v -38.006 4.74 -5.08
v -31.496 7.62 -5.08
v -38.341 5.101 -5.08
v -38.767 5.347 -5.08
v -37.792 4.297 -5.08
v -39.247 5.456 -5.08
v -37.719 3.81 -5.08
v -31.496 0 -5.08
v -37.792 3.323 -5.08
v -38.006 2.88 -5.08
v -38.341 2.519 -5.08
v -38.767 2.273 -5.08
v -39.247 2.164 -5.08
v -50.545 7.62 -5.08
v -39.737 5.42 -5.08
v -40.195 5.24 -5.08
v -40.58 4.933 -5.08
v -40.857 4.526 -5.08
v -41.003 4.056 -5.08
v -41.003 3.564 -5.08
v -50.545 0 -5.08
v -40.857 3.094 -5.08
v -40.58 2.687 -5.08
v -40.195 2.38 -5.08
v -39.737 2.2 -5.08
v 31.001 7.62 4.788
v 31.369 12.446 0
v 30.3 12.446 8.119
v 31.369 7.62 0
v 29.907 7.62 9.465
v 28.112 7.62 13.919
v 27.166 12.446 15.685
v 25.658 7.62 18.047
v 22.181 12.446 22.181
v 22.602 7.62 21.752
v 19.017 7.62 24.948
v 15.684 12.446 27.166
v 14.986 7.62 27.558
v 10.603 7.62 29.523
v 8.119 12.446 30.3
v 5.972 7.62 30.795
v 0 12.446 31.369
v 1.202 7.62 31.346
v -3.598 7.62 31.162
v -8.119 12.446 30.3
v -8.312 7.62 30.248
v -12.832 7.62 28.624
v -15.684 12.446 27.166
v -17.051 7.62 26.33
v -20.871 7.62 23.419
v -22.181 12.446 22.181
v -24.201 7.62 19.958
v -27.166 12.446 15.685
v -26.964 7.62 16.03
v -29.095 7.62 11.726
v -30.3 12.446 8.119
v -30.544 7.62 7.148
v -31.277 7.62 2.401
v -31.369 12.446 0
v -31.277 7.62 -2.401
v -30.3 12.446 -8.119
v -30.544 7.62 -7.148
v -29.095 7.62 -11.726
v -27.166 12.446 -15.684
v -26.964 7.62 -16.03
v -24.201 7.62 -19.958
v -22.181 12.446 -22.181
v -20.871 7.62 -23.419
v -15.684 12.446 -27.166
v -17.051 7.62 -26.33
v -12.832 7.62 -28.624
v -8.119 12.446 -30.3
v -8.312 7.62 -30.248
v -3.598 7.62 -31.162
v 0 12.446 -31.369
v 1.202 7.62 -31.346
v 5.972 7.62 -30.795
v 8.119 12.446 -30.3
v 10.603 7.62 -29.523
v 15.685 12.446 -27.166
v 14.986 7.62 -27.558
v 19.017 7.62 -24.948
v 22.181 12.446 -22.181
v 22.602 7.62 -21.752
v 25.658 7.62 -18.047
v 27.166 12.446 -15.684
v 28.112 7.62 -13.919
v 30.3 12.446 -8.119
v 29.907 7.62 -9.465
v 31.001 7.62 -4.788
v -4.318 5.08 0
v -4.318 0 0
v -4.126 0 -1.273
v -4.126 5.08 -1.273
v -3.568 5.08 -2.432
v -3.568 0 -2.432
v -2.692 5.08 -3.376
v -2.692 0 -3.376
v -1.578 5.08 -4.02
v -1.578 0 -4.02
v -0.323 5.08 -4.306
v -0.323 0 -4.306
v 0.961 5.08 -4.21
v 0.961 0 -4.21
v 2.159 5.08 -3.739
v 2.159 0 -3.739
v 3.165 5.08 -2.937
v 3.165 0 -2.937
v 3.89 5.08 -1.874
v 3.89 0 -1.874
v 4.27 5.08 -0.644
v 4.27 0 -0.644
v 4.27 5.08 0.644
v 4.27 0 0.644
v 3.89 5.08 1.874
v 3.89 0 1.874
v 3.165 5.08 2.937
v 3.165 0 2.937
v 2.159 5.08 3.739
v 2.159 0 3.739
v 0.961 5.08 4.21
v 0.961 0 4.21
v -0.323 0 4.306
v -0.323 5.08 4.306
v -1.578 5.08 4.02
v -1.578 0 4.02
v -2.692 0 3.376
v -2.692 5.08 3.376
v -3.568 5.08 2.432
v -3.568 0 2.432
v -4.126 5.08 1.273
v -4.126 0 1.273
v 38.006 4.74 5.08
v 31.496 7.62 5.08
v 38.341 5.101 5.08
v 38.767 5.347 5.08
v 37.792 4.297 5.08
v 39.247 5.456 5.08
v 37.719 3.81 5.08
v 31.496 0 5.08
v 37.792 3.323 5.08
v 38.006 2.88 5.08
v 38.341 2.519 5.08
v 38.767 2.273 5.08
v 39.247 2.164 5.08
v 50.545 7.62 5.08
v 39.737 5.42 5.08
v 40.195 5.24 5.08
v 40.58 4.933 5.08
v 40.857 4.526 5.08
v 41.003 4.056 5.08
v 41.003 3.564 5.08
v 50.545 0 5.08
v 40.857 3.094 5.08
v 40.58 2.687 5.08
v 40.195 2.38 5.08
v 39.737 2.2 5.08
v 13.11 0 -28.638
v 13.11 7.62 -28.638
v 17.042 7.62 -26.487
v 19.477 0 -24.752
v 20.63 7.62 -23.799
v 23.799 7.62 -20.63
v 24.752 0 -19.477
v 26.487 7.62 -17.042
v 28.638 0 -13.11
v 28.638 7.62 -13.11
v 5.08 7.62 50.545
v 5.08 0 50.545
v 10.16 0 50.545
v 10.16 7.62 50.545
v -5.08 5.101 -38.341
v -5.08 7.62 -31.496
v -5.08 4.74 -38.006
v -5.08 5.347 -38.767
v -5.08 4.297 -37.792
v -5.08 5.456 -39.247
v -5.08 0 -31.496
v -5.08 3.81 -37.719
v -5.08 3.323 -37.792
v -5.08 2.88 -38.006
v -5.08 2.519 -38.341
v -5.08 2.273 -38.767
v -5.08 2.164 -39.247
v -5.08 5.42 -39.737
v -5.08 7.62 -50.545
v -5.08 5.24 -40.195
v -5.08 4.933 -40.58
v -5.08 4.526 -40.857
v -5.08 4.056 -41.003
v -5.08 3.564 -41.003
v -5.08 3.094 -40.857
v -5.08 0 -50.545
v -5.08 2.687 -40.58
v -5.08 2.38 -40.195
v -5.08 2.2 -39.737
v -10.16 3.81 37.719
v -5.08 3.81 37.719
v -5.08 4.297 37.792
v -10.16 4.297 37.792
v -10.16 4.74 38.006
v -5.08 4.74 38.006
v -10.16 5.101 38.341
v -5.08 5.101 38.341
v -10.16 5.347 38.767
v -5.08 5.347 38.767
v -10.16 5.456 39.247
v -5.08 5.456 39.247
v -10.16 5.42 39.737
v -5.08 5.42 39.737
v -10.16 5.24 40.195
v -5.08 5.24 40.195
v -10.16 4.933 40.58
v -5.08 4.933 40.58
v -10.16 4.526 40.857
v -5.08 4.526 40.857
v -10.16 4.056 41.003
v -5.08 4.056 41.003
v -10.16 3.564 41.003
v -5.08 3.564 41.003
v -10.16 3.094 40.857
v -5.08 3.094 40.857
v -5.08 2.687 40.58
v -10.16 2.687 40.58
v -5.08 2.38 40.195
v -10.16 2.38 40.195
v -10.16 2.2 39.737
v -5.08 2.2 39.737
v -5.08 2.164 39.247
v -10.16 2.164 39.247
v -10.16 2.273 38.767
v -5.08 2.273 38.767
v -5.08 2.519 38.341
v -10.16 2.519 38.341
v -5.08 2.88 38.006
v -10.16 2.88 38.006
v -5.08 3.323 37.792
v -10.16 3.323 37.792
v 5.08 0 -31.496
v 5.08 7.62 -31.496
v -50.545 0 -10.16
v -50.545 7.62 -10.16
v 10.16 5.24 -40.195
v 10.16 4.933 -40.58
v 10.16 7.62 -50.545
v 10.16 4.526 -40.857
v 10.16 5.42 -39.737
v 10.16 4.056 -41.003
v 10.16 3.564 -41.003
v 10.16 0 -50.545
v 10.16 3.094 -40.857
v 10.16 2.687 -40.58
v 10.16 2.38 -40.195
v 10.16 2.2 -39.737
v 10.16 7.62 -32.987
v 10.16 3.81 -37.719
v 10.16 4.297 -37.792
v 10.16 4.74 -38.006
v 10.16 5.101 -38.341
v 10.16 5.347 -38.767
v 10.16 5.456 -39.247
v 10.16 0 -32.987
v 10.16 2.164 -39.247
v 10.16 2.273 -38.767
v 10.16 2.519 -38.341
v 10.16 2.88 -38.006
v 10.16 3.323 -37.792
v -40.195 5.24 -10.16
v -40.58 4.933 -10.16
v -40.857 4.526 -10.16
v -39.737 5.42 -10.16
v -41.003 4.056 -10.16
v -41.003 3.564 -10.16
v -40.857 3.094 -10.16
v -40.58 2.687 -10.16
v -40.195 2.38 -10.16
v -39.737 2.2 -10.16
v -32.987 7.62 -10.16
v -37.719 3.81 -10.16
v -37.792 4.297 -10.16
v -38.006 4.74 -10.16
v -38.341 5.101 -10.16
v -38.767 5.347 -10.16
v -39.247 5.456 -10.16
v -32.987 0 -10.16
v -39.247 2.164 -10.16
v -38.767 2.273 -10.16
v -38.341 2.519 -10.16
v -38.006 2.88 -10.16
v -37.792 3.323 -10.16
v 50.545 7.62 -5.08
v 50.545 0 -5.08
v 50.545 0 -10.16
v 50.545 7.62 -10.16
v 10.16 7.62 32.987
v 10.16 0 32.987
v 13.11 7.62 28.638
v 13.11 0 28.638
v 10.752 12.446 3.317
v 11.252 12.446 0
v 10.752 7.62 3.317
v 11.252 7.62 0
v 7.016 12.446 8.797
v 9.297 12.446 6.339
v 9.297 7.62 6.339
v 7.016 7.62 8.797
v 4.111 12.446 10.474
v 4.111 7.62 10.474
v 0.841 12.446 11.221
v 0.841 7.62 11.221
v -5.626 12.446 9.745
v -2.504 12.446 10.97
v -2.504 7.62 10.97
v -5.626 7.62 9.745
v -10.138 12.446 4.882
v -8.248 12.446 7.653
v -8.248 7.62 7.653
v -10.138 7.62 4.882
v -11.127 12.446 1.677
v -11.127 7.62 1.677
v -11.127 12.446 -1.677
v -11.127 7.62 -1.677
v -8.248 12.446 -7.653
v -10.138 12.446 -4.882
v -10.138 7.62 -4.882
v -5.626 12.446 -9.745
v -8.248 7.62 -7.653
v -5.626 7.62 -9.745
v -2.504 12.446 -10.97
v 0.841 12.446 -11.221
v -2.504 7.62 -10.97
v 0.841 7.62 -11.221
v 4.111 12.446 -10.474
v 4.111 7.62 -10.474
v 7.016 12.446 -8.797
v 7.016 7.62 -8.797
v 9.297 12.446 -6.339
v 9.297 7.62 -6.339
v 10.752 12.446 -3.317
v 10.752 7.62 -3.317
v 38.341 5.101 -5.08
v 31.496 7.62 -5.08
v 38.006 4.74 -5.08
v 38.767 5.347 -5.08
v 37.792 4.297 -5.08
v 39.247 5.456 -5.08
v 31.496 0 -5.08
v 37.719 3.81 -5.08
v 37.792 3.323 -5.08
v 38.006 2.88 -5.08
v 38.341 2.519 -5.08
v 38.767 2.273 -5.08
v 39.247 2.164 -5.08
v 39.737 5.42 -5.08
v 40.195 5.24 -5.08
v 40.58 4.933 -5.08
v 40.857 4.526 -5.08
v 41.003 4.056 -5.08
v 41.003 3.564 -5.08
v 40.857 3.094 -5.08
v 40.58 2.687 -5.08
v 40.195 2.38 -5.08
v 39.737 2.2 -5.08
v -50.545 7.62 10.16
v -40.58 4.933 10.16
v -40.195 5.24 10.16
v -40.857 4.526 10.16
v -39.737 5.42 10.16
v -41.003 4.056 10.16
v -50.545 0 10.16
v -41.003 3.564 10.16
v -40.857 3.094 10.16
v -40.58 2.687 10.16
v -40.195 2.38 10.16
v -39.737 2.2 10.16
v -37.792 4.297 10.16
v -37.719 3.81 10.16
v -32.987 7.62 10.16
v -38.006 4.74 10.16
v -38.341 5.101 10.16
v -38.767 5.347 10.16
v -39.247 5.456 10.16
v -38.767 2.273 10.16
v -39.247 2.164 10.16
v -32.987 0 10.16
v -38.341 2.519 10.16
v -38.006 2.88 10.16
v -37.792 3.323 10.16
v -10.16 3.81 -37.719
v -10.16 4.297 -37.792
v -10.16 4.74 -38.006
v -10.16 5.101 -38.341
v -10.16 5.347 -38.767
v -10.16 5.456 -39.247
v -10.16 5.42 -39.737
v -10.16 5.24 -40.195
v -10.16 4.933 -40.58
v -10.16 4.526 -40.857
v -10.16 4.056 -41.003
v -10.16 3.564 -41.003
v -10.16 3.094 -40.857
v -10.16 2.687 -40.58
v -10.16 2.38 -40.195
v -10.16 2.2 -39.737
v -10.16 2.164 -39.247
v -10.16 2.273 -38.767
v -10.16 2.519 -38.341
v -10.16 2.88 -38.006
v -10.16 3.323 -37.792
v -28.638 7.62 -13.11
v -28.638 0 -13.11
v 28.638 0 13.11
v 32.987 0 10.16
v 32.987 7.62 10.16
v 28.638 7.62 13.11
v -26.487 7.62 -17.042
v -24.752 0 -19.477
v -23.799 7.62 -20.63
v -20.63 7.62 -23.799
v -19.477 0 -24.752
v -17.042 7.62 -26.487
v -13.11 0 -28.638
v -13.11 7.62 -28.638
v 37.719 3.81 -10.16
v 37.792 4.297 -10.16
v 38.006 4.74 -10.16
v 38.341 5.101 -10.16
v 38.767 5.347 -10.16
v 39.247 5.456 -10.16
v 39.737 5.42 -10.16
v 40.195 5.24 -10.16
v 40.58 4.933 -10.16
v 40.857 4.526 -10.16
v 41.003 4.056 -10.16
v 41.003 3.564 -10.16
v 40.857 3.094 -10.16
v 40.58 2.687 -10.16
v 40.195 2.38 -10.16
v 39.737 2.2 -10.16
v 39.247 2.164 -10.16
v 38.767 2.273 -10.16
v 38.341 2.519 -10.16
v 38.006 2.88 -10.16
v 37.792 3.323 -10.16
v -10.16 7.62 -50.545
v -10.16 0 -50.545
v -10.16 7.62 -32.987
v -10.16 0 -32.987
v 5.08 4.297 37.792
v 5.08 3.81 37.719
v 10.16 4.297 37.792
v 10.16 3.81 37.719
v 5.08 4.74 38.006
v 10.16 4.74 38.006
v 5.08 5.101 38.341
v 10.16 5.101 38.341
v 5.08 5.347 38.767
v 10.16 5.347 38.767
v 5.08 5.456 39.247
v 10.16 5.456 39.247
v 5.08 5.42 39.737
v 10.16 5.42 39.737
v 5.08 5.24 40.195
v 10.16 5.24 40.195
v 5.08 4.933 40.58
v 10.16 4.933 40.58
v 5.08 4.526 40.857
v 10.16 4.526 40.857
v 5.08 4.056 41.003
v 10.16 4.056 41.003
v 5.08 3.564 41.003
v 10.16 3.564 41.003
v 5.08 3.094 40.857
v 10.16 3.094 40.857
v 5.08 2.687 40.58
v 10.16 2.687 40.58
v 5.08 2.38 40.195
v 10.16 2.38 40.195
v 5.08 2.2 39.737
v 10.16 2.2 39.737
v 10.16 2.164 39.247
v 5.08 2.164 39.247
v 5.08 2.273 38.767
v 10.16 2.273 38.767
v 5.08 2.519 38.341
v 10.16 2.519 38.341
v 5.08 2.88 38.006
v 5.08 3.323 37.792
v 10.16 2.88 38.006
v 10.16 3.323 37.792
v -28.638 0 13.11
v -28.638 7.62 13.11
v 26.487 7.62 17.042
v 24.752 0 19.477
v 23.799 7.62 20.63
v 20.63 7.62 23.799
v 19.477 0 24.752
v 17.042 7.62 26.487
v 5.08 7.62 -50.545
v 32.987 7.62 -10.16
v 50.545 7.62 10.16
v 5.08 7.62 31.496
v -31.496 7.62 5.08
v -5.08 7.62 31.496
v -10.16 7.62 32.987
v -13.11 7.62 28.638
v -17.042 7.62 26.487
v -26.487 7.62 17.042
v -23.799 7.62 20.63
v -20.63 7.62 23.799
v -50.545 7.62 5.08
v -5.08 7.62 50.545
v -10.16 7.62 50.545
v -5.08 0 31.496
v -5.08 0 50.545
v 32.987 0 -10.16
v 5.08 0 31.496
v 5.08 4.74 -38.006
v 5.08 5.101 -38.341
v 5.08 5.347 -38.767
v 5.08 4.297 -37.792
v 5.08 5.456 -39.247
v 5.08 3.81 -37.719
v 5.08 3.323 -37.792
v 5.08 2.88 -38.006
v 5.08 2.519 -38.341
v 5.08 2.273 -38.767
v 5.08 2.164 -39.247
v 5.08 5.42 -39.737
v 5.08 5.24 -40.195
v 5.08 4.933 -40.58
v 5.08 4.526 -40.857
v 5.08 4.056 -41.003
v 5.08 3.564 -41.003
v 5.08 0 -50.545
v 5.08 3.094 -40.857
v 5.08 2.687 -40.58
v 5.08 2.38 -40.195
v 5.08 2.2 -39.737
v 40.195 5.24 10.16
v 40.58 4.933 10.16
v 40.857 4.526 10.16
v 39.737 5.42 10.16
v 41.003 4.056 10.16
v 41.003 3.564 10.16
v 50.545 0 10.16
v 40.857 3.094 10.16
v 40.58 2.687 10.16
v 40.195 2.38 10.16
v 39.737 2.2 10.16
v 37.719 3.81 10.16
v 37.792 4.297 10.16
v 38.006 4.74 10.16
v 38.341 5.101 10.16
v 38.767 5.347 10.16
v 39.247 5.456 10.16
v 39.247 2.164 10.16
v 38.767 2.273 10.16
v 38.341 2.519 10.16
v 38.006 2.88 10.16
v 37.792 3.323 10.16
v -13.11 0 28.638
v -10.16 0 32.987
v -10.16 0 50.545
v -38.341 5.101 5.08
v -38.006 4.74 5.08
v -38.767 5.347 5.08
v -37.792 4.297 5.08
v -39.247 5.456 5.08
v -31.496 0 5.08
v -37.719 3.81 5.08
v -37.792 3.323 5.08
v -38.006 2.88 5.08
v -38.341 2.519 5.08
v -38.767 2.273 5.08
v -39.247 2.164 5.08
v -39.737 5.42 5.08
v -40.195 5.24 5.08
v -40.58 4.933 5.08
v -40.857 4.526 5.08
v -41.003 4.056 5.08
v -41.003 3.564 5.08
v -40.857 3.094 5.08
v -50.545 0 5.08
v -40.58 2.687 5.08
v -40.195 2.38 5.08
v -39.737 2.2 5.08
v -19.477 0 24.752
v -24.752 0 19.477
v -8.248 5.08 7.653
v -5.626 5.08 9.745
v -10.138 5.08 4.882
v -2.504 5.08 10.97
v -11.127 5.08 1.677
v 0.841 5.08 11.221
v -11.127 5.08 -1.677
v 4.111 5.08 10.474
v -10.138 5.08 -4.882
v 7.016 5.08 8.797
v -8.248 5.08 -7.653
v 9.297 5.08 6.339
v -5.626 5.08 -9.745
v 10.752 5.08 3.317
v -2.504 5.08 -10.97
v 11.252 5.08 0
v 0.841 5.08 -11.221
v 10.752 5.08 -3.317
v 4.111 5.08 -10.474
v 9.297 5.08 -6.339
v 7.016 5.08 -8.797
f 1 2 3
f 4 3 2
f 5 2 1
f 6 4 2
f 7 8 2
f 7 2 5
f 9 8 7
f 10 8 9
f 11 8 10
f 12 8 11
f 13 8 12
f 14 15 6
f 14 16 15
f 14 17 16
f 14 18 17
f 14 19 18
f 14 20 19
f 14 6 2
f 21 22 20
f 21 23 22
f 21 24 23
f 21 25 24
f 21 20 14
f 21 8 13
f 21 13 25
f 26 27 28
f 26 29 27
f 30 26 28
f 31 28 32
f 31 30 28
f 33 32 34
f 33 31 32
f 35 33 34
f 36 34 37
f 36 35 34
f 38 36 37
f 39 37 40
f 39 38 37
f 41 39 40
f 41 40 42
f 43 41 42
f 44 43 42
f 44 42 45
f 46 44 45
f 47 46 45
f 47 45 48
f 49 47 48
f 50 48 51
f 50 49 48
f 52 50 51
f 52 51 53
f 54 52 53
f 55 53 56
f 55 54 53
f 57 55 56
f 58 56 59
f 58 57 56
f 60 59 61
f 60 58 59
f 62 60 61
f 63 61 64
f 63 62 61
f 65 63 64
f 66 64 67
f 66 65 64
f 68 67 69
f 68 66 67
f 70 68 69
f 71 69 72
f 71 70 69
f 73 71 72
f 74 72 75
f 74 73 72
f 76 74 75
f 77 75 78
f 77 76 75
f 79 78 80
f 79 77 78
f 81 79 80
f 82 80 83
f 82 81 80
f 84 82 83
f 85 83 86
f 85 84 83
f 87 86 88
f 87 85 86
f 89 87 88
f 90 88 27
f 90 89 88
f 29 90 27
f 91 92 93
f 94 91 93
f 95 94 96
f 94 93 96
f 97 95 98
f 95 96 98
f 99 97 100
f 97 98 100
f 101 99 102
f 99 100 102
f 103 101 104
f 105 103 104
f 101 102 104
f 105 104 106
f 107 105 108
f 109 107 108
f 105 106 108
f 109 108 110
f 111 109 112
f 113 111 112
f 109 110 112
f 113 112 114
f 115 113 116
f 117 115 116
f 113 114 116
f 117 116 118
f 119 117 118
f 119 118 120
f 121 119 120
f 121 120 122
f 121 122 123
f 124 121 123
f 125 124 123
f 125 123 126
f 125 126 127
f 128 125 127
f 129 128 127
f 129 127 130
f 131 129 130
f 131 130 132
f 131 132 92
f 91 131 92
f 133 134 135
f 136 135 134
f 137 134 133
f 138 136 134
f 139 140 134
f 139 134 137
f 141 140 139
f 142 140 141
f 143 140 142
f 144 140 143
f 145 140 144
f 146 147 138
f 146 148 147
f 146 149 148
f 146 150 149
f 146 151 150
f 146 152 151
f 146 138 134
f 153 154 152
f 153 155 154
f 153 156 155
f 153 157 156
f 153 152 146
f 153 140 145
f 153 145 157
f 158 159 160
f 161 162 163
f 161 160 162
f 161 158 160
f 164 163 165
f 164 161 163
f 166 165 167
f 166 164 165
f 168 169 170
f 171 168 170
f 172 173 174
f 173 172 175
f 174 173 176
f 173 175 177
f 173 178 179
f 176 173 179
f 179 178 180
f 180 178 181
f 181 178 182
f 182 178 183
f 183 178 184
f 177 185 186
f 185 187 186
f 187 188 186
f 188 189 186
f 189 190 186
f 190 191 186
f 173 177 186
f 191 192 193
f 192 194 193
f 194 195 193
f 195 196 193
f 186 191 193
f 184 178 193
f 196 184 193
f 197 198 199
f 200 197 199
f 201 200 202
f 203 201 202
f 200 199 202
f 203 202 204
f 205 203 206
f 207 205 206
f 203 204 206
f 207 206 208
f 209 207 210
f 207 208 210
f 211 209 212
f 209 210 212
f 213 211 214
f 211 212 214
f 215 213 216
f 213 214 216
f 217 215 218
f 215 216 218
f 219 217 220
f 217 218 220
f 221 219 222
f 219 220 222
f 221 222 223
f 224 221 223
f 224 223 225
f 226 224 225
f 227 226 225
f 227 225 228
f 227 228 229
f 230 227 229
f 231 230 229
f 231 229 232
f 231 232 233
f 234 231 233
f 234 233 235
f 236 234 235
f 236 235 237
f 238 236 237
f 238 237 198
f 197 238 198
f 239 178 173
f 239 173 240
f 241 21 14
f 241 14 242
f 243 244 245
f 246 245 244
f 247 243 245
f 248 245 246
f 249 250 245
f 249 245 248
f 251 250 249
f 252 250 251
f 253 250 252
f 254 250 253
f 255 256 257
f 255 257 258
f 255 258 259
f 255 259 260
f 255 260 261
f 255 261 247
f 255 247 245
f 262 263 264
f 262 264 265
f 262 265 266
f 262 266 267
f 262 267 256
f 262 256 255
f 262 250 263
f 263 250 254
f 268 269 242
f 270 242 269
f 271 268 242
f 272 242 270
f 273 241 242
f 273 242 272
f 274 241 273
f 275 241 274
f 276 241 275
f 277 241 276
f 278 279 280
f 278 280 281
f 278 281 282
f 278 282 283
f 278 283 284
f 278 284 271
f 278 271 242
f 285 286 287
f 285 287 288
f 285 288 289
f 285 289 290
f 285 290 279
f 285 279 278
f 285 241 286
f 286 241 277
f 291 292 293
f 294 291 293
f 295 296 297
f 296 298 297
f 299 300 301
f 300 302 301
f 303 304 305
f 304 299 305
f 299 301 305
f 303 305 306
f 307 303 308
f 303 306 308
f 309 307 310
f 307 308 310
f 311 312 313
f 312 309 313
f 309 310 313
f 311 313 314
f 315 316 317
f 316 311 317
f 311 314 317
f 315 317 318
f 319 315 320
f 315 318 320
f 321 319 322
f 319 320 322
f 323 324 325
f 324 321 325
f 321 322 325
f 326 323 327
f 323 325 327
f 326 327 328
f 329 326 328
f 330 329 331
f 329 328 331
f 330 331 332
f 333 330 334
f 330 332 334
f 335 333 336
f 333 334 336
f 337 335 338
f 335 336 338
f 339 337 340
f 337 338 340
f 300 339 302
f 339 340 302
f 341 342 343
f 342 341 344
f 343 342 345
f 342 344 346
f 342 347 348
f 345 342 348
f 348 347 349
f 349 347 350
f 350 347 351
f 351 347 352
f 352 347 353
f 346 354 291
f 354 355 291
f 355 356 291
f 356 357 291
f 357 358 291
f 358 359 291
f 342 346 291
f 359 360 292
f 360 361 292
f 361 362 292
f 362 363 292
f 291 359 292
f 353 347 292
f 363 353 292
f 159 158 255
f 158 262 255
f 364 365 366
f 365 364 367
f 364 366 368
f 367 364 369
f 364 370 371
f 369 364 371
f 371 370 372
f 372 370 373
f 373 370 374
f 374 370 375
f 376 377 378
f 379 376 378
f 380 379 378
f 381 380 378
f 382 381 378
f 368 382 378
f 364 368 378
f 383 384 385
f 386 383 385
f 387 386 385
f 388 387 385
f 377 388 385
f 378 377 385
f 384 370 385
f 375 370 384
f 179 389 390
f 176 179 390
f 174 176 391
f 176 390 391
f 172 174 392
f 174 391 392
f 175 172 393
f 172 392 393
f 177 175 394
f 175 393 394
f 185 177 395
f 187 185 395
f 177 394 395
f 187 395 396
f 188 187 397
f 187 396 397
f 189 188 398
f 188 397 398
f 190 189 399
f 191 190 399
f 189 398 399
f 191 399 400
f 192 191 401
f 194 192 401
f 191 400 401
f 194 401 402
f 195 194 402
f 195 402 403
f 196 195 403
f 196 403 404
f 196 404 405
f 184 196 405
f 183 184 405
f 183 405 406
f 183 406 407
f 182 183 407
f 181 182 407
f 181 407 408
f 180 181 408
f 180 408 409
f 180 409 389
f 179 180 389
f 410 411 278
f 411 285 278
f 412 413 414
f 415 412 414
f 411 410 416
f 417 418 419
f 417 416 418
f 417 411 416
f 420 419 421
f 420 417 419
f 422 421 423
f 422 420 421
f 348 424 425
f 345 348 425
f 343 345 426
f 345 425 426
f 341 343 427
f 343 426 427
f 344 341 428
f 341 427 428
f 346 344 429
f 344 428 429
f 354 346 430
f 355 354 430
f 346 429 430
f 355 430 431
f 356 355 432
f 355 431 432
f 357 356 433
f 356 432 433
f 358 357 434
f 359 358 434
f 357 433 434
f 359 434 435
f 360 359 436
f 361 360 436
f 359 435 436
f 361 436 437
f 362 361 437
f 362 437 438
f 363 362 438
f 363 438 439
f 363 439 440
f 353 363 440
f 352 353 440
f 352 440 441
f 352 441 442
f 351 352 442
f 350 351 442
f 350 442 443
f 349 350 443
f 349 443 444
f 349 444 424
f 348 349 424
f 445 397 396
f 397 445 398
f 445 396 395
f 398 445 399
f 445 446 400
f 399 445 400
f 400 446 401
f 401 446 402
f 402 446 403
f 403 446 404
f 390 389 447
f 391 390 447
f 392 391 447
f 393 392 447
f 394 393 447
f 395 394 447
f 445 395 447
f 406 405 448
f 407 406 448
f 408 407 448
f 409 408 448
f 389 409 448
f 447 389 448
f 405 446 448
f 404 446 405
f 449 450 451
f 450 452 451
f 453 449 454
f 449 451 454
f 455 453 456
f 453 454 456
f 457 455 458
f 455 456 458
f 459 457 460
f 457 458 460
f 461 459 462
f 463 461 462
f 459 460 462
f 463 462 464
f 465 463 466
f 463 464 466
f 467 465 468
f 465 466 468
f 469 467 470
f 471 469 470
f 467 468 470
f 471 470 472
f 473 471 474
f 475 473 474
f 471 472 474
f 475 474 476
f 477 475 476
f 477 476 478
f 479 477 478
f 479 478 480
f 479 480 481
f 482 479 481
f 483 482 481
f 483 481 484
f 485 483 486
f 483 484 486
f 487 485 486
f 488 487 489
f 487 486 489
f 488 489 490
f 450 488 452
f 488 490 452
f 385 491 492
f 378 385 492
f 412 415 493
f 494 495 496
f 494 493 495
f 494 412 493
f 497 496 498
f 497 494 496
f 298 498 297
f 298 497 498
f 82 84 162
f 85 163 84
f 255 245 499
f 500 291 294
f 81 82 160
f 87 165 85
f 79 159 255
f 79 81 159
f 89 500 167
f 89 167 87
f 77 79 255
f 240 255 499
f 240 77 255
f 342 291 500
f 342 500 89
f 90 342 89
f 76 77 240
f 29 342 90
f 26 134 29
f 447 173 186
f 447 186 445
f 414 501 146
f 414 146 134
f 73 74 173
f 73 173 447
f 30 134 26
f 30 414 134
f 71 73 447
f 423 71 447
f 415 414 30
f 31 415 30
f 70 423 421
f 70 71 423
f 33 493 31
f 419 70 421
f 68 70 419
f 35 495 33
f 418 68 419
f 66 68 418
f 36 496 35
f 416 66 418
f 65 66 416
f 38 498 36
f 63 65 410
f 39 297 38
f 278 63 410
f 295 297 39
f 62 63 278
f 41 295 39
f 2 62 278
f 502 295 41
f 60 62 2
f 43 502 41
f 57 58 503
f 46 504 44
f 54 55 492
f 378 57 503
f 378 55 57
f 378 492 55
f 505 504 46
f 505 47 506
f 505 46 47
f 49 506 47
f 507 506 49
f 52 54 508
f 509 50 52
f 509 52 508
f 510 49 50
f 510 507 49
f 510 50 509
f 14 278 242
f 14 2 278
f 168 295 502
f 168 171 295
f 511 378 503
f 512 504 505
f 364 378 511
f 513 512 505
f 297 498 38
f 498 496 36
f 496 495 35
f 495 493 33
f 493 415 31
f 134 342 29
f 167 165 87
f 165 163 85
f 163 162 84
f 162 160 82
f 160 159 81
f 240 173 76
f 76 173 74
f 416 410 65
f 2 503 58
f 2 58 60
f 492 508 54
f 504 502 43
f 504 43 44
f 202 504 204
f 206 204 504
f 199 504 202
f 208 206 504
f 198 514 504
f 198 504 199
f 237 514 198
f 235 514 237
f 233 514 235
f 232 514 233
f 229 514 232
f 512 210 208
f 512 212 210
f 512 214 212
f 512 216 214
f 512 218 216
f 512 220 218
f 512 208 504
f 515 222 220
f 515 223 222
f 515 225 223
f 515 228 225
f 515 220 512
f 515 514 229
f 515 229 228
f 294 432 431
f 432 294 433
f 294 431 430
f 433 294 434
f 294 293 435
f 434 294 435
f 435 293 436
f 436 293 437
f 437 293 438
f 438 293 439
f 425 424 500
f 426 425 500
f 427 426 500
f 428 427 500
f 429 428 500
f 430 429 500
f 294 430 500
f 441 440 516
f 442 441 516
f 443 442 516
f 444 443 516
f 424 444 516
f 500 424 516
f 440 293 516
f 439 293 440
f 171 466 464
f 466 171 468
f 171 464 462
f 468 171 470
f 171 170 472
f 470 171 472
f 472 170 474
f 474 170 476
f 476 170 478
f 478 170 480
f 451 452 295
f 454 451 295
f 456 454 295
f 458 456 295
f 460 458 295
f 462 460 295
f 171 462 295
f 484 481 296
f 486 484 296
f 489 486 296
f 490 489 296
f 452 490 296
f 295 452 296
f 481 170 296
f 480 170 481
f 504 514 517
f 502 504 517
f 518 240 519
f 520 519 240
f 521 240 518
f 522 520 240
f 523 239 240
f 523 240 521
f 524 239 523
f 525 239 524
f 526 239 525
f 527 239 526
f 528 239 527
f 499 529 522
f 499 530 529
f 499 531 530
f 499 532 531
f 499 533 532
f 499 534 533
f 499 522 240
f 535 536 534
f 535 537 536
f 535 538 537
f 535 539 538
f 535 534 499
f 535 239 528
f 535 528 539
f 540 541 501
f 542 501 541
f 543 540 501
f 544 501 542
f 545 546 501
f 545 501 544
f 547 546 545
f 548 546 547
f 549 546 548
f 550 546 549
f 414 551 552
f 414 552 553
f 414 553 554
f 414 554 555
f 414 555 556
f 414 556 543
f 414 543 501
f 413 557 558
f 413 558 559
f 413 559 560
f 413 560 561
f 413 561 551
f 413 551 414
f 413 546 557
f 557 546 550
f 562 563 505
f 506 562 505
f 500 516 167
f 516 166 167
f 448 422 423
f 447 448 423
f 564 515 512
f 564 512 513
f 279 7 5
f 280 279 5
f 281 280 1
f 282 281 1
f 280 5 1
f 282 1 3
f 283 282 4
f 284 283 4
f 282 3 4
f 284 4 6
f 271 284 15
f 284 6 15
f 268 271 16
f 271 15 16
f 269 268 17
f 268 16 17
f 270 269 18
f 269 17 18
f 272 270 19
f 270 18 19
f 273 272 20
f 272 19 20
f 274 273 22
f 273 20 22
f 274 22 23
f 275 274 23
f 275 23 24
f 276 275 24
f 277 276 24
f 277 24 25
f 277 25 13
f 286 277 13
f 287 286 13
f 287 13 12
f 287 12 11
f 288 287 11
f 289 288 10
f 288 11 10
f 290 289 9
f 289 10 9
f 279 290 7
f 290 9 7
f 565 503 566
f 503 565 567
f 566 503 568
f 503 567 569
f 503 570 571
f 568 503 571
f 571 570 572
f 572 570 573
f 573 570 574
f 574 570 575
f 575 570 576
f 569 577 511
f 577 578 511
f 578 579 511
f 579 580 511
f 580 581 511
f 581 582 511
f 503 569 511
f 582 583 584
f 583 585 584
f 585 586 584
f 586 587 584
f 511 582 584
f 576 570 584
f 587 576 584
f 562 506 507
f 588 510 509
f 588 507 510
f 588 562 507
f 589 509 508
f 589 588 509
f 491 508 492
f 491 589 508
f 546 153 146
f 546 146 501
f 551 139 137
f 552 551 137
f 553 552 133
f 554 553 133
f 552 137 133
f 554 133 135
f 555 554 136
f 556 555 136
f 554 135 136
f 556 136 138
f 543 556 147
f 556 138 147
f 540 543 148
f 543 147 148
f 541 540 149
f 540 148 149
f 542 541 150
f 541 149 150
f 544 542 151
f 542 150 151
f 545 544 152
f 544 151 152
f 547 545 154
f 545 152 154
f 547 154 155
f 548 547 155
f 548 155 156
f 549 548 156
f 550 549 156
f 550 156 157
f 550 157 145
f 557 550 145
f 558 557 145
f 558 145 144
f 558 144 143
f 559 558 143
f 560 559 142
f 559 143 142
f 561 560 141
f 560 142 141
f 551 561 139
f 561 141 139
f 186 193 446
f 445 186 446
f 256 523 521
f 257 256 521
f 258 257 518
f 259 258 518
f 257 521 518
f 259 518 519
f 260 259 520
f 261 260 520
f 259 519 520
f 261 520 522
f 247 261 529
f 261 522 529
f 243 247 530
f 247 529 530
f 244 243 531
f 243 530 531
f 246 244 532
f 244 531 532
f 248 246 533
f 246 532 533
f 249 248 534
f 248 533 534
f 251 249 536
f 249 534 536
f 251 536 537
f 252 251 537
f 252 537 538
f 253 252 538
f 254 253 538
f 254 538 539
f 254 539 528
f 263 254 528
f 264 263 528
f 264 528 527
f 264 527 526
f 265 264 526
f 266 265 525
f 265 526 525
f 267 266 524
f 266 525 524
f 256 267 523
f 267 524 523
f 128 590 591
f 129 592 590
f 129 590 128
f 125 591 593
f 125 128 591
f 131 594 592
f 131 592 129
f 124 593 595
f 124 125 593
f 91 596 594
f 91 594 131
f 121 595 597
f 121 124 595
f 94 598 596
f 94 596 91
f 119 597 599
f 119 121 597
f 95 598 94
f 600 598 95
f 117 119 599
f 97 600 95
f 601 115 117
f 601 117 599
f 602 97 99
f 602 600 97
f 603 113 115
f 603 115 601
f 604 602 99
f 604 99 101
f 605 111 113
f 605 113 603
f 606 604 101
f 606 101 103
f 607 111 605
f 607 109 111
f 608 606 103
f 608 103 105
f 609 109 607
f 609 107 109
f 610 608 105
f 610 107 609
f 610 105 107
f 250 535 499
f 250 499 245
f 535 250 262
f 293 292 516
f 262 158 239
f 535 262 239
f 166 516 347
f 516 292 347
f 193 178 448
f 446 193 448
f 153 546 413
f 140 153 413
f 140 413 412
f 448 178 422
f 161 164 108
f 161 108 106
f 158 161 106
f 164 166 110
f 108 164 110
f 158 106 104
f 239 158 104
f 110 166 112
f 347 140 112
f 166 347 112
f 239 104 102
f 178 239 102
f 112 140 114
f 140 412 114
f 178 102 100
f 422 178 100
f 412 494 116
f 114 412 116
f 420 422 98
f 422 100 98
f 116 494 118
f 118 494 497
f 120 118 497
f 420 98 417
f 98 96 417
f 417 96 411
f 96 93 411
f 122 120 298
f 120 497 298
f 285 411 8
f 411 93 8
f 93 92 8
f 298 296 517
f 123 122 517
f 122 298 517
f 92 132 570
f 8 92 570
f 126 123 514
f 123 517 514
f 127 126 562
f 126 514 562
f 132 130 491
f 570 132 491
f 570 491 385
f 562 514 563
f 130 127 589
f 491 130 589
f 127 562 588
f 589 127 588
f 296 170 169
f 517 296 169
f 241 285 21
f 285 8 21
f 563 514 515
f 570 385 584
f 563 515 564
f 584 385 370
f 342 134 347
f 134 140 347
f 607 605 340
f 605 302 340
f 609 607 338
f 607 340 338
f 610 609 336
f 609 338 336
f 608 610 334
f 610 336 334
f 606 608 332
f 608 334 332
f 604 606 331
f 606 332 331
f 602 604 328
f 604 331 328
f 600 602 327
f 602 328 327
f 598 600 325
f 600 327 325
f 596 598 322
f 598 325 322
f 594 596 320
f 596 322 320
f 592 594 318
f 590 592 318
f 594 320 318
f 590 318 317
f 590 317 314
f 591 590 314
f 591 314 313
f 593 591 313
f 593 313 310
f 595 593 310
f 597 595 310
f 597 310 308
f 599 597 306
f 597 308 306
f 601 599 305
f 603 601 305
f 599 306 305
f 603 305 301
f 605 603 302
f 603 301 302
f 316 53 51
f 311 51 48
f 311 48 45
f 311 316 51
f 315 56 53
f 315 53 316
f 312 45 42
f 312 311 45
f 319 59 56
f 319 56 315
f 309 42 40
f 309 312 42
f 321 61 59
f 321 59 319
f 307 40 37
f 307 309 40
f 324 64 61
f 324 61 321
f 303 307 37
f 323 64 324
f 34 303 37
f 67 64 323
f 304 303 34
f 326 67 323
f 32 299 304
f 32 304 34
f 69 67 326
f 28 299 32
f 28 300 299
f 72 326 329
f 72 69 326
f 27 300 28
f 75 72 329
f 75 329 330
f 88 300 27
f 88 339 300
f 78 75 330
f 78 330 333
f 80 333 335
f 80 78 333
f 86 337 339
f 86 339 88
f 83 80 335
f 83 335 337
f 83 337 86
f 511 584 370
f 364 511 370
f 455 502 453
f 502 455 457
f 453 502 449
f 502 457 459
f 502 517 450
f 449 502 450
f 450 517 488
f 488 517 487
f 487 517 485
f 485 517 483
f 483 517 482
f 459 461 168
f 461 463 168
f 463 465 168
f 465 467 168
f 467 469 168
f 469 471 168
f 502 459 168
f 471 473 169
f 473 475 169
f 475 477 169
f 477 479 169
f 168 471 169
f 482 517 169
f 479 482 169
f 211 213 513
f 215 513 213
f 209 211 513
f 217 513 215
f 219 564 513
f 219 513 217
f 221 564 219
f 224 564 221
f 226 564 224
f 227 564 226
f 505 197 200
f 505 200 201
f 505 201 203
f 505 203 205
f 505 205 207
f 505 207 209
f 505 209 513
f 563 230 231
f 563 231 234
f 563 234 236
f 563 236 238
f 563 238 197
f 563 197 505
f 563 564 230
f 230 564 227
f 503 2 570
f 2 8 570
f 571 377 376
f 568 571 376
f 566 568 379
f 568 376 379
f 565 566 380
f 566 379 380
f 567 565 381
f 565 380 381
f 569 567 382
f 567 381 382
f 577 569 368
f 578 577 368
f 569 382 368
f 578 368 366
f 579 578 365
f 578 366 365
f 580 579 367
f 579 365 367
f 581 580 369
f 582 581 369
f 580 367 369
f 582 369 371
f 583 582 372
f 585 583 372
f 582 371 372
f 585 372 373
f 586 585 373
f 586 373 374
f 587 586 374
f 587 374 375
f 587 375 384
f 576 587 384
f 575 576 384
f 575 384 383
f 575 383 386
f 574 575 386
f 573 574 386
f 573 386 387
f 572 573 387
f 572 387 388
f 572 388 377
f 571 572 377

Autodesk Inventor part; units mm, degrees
ref_plane "YZ Plane" through (0, 0, 0) normal (1, 0, 0) x (0, 1, 0)
ref_plane "XZ Plane" through (0, 0, 0) normal (0, 1, 0) x (-1, 0, 0)
ref_plane "XY Plane" through (0, 0, 0) normal (0, 0, 1) x (1, 0, 0)
sketch "Sketch1" plane through (0, 0, 0) normal (0, 1, 0) x (-1, 0, 0)
  circle A0 centre (0, 0) radius 4.318
  line L0 (0, -31.496) -> (5.08, -31.496)
  line L1 (0, -31.496) -> (-5.08, -31.496)
  line L2 (31.496, 0) -> (31.496, 5.08)
  line L3 (31.496, 0) -> (31.496, -5.08)
  line L4 (0, 31.496) -> (-5.08, 31.496)
  line L5 (0, 31.496) -> (5.08, 31.496)
  line L6 (-31.496, 0) -> (-31.496, -5.08)
  line L7 (-31.496, 0) -> (-31.496, 5.08)
  line L8 (31.496, 5.08) -> (50.5454, 5.08)
  line L9 (31.496, -5.08) -> (50.5454, -5.08)
  line L10 (5.08, -31.496) -> (5.08, -50.5454)
  line L11 (-5.08, -31.496) -> (-5.08, -50.5454)
  line L12 (-31.496, -5.08) -> (-50.5454, -5.08)
  line L13 (-31.496, 5.08) -> (-50.5454, 5.08)
  line L14 (-5.08, 31.496) -> (-5.08, 50.5454)
  line L15 (5.08, 31.496) -> (5.08, 50.5454)
  line L16 (-50.5454, 5.08) -> (-50.5454, 10.16)
  line L17 (-50.5454, -5.08) -> (-50.5454, -10.16)
  line L18 (-5.08, -50.5454) -> (-10.16, -50.5454)
  line L19 (5.08, -50.5454) -> (10.16, -50.5454)
  line L20 (50.5454, -5.08) -> (50.5454, -10.16)
  line L21 (50.5454, 5.08) -> (50.5454, 10.16)
  line L22 (5.08, 50.5454) -> (10.16, 50.5454)
  line L23 (-5.08, 50.5454) -> (-10.16, 50.5454)
  line L24 (-10.16, 50.5454) -> (-10.16, 29.8123)
  line L25 (10.16, 50.5454) -> (10.16, 29.8123)
  line L26 (-50.5454, 10.16) -> (-29.8123, 10.16)
  line L27 (-50.5454, -10.16) -> (-29.8123, -10.16)
  line L28 (-10.16, -50.5454) -> (-10.16, -29.8123)
  line L29 (10.16, -50.5454) -> (10.16, -29.8123)
  line L30 (50.5454, -10.16) -> (29.8123, -10.16)
  line L31 (50.5454, 10.16) -> (29.8123, 10.16)
  arc A1 (-10.16, 29.8123) -> (-29.8123, 10.16) centre (0, 0) ccw
  arc A2 (-29.8123, -10.16) -> (-10.16, -29.8123) centre (0, 0) ccw
  arc A3 (10.16, -29.8123) -> (29.8123, -10.16) centre (0, 0) ccw
  arc A4 (29.8123, 10.16) -> (10.16, 29.8123) centre (0, 0) ccw
  dimension "d7" = 360
  dimension "d13" = 360
  dimension "d0" = 8.636
  dimension "d9" = 5.08
  dimension "d10" = 5.08
extrude "Extrusion1" add sketch "Sketch1" along normal blind 7.62
sketch "Sketch2" plane through (10.16, 0, 50.5454) normal (1, 0, 0) x (0, 0, -1)
  line L0 (0, 0) -> (20.7331, 0) projected
  circle A0 centre (11.1754, 3.81) radius 1.651
  point P0 (50.5454, 0)
  dimension "d19" = 3.302
extrude "Extrusion2" cut sketch "Sketch2" against normal up to surface (20.32 mm away)
pattern_circular "Circular Pattern1" count 4 over 360 about axis through (0, 0, 0) along (0, 1, 0) of "Extrusion2"
sketch "Sketch3" plane through (0, 7.62, 0) normal (0, 1, 0) x (1, 0, 0)
  circle A0 centre (0, 0) radius 31.369
  circle A1 centre (0, 0) radius 11.2522
  dimension "d25" = 62.738
  dimension "d26" = 22.5044
extrude "Extrusion3" add sketch "Sketch3" along normal blind 4.826
sketch "Sketch4" plane through (0, 7.62, 0) normal (0, 1, 0) x (1, 0, 0)
  circle A0 centre (0, 0) radius 11.2522 projected
extrude "Extrusion4" cut sketch "Sketch4" against normal blind 2.54
chamfer "Chamfer1" distance 3.175 angle 45 8 edges at (10.16, 3.81, 29.8123) (29.8123, 3.81, 10.16) (-10.16, 3.81, 29.8123) (-29.8123, 3.81, 10.16) (-29.8123, 3.81, -10.16) (-10.16, 3.81, -29.8123) (10.16, 3.81, -29.8123) (29.8123, 3.81, -10.16)
properties part number "center"
